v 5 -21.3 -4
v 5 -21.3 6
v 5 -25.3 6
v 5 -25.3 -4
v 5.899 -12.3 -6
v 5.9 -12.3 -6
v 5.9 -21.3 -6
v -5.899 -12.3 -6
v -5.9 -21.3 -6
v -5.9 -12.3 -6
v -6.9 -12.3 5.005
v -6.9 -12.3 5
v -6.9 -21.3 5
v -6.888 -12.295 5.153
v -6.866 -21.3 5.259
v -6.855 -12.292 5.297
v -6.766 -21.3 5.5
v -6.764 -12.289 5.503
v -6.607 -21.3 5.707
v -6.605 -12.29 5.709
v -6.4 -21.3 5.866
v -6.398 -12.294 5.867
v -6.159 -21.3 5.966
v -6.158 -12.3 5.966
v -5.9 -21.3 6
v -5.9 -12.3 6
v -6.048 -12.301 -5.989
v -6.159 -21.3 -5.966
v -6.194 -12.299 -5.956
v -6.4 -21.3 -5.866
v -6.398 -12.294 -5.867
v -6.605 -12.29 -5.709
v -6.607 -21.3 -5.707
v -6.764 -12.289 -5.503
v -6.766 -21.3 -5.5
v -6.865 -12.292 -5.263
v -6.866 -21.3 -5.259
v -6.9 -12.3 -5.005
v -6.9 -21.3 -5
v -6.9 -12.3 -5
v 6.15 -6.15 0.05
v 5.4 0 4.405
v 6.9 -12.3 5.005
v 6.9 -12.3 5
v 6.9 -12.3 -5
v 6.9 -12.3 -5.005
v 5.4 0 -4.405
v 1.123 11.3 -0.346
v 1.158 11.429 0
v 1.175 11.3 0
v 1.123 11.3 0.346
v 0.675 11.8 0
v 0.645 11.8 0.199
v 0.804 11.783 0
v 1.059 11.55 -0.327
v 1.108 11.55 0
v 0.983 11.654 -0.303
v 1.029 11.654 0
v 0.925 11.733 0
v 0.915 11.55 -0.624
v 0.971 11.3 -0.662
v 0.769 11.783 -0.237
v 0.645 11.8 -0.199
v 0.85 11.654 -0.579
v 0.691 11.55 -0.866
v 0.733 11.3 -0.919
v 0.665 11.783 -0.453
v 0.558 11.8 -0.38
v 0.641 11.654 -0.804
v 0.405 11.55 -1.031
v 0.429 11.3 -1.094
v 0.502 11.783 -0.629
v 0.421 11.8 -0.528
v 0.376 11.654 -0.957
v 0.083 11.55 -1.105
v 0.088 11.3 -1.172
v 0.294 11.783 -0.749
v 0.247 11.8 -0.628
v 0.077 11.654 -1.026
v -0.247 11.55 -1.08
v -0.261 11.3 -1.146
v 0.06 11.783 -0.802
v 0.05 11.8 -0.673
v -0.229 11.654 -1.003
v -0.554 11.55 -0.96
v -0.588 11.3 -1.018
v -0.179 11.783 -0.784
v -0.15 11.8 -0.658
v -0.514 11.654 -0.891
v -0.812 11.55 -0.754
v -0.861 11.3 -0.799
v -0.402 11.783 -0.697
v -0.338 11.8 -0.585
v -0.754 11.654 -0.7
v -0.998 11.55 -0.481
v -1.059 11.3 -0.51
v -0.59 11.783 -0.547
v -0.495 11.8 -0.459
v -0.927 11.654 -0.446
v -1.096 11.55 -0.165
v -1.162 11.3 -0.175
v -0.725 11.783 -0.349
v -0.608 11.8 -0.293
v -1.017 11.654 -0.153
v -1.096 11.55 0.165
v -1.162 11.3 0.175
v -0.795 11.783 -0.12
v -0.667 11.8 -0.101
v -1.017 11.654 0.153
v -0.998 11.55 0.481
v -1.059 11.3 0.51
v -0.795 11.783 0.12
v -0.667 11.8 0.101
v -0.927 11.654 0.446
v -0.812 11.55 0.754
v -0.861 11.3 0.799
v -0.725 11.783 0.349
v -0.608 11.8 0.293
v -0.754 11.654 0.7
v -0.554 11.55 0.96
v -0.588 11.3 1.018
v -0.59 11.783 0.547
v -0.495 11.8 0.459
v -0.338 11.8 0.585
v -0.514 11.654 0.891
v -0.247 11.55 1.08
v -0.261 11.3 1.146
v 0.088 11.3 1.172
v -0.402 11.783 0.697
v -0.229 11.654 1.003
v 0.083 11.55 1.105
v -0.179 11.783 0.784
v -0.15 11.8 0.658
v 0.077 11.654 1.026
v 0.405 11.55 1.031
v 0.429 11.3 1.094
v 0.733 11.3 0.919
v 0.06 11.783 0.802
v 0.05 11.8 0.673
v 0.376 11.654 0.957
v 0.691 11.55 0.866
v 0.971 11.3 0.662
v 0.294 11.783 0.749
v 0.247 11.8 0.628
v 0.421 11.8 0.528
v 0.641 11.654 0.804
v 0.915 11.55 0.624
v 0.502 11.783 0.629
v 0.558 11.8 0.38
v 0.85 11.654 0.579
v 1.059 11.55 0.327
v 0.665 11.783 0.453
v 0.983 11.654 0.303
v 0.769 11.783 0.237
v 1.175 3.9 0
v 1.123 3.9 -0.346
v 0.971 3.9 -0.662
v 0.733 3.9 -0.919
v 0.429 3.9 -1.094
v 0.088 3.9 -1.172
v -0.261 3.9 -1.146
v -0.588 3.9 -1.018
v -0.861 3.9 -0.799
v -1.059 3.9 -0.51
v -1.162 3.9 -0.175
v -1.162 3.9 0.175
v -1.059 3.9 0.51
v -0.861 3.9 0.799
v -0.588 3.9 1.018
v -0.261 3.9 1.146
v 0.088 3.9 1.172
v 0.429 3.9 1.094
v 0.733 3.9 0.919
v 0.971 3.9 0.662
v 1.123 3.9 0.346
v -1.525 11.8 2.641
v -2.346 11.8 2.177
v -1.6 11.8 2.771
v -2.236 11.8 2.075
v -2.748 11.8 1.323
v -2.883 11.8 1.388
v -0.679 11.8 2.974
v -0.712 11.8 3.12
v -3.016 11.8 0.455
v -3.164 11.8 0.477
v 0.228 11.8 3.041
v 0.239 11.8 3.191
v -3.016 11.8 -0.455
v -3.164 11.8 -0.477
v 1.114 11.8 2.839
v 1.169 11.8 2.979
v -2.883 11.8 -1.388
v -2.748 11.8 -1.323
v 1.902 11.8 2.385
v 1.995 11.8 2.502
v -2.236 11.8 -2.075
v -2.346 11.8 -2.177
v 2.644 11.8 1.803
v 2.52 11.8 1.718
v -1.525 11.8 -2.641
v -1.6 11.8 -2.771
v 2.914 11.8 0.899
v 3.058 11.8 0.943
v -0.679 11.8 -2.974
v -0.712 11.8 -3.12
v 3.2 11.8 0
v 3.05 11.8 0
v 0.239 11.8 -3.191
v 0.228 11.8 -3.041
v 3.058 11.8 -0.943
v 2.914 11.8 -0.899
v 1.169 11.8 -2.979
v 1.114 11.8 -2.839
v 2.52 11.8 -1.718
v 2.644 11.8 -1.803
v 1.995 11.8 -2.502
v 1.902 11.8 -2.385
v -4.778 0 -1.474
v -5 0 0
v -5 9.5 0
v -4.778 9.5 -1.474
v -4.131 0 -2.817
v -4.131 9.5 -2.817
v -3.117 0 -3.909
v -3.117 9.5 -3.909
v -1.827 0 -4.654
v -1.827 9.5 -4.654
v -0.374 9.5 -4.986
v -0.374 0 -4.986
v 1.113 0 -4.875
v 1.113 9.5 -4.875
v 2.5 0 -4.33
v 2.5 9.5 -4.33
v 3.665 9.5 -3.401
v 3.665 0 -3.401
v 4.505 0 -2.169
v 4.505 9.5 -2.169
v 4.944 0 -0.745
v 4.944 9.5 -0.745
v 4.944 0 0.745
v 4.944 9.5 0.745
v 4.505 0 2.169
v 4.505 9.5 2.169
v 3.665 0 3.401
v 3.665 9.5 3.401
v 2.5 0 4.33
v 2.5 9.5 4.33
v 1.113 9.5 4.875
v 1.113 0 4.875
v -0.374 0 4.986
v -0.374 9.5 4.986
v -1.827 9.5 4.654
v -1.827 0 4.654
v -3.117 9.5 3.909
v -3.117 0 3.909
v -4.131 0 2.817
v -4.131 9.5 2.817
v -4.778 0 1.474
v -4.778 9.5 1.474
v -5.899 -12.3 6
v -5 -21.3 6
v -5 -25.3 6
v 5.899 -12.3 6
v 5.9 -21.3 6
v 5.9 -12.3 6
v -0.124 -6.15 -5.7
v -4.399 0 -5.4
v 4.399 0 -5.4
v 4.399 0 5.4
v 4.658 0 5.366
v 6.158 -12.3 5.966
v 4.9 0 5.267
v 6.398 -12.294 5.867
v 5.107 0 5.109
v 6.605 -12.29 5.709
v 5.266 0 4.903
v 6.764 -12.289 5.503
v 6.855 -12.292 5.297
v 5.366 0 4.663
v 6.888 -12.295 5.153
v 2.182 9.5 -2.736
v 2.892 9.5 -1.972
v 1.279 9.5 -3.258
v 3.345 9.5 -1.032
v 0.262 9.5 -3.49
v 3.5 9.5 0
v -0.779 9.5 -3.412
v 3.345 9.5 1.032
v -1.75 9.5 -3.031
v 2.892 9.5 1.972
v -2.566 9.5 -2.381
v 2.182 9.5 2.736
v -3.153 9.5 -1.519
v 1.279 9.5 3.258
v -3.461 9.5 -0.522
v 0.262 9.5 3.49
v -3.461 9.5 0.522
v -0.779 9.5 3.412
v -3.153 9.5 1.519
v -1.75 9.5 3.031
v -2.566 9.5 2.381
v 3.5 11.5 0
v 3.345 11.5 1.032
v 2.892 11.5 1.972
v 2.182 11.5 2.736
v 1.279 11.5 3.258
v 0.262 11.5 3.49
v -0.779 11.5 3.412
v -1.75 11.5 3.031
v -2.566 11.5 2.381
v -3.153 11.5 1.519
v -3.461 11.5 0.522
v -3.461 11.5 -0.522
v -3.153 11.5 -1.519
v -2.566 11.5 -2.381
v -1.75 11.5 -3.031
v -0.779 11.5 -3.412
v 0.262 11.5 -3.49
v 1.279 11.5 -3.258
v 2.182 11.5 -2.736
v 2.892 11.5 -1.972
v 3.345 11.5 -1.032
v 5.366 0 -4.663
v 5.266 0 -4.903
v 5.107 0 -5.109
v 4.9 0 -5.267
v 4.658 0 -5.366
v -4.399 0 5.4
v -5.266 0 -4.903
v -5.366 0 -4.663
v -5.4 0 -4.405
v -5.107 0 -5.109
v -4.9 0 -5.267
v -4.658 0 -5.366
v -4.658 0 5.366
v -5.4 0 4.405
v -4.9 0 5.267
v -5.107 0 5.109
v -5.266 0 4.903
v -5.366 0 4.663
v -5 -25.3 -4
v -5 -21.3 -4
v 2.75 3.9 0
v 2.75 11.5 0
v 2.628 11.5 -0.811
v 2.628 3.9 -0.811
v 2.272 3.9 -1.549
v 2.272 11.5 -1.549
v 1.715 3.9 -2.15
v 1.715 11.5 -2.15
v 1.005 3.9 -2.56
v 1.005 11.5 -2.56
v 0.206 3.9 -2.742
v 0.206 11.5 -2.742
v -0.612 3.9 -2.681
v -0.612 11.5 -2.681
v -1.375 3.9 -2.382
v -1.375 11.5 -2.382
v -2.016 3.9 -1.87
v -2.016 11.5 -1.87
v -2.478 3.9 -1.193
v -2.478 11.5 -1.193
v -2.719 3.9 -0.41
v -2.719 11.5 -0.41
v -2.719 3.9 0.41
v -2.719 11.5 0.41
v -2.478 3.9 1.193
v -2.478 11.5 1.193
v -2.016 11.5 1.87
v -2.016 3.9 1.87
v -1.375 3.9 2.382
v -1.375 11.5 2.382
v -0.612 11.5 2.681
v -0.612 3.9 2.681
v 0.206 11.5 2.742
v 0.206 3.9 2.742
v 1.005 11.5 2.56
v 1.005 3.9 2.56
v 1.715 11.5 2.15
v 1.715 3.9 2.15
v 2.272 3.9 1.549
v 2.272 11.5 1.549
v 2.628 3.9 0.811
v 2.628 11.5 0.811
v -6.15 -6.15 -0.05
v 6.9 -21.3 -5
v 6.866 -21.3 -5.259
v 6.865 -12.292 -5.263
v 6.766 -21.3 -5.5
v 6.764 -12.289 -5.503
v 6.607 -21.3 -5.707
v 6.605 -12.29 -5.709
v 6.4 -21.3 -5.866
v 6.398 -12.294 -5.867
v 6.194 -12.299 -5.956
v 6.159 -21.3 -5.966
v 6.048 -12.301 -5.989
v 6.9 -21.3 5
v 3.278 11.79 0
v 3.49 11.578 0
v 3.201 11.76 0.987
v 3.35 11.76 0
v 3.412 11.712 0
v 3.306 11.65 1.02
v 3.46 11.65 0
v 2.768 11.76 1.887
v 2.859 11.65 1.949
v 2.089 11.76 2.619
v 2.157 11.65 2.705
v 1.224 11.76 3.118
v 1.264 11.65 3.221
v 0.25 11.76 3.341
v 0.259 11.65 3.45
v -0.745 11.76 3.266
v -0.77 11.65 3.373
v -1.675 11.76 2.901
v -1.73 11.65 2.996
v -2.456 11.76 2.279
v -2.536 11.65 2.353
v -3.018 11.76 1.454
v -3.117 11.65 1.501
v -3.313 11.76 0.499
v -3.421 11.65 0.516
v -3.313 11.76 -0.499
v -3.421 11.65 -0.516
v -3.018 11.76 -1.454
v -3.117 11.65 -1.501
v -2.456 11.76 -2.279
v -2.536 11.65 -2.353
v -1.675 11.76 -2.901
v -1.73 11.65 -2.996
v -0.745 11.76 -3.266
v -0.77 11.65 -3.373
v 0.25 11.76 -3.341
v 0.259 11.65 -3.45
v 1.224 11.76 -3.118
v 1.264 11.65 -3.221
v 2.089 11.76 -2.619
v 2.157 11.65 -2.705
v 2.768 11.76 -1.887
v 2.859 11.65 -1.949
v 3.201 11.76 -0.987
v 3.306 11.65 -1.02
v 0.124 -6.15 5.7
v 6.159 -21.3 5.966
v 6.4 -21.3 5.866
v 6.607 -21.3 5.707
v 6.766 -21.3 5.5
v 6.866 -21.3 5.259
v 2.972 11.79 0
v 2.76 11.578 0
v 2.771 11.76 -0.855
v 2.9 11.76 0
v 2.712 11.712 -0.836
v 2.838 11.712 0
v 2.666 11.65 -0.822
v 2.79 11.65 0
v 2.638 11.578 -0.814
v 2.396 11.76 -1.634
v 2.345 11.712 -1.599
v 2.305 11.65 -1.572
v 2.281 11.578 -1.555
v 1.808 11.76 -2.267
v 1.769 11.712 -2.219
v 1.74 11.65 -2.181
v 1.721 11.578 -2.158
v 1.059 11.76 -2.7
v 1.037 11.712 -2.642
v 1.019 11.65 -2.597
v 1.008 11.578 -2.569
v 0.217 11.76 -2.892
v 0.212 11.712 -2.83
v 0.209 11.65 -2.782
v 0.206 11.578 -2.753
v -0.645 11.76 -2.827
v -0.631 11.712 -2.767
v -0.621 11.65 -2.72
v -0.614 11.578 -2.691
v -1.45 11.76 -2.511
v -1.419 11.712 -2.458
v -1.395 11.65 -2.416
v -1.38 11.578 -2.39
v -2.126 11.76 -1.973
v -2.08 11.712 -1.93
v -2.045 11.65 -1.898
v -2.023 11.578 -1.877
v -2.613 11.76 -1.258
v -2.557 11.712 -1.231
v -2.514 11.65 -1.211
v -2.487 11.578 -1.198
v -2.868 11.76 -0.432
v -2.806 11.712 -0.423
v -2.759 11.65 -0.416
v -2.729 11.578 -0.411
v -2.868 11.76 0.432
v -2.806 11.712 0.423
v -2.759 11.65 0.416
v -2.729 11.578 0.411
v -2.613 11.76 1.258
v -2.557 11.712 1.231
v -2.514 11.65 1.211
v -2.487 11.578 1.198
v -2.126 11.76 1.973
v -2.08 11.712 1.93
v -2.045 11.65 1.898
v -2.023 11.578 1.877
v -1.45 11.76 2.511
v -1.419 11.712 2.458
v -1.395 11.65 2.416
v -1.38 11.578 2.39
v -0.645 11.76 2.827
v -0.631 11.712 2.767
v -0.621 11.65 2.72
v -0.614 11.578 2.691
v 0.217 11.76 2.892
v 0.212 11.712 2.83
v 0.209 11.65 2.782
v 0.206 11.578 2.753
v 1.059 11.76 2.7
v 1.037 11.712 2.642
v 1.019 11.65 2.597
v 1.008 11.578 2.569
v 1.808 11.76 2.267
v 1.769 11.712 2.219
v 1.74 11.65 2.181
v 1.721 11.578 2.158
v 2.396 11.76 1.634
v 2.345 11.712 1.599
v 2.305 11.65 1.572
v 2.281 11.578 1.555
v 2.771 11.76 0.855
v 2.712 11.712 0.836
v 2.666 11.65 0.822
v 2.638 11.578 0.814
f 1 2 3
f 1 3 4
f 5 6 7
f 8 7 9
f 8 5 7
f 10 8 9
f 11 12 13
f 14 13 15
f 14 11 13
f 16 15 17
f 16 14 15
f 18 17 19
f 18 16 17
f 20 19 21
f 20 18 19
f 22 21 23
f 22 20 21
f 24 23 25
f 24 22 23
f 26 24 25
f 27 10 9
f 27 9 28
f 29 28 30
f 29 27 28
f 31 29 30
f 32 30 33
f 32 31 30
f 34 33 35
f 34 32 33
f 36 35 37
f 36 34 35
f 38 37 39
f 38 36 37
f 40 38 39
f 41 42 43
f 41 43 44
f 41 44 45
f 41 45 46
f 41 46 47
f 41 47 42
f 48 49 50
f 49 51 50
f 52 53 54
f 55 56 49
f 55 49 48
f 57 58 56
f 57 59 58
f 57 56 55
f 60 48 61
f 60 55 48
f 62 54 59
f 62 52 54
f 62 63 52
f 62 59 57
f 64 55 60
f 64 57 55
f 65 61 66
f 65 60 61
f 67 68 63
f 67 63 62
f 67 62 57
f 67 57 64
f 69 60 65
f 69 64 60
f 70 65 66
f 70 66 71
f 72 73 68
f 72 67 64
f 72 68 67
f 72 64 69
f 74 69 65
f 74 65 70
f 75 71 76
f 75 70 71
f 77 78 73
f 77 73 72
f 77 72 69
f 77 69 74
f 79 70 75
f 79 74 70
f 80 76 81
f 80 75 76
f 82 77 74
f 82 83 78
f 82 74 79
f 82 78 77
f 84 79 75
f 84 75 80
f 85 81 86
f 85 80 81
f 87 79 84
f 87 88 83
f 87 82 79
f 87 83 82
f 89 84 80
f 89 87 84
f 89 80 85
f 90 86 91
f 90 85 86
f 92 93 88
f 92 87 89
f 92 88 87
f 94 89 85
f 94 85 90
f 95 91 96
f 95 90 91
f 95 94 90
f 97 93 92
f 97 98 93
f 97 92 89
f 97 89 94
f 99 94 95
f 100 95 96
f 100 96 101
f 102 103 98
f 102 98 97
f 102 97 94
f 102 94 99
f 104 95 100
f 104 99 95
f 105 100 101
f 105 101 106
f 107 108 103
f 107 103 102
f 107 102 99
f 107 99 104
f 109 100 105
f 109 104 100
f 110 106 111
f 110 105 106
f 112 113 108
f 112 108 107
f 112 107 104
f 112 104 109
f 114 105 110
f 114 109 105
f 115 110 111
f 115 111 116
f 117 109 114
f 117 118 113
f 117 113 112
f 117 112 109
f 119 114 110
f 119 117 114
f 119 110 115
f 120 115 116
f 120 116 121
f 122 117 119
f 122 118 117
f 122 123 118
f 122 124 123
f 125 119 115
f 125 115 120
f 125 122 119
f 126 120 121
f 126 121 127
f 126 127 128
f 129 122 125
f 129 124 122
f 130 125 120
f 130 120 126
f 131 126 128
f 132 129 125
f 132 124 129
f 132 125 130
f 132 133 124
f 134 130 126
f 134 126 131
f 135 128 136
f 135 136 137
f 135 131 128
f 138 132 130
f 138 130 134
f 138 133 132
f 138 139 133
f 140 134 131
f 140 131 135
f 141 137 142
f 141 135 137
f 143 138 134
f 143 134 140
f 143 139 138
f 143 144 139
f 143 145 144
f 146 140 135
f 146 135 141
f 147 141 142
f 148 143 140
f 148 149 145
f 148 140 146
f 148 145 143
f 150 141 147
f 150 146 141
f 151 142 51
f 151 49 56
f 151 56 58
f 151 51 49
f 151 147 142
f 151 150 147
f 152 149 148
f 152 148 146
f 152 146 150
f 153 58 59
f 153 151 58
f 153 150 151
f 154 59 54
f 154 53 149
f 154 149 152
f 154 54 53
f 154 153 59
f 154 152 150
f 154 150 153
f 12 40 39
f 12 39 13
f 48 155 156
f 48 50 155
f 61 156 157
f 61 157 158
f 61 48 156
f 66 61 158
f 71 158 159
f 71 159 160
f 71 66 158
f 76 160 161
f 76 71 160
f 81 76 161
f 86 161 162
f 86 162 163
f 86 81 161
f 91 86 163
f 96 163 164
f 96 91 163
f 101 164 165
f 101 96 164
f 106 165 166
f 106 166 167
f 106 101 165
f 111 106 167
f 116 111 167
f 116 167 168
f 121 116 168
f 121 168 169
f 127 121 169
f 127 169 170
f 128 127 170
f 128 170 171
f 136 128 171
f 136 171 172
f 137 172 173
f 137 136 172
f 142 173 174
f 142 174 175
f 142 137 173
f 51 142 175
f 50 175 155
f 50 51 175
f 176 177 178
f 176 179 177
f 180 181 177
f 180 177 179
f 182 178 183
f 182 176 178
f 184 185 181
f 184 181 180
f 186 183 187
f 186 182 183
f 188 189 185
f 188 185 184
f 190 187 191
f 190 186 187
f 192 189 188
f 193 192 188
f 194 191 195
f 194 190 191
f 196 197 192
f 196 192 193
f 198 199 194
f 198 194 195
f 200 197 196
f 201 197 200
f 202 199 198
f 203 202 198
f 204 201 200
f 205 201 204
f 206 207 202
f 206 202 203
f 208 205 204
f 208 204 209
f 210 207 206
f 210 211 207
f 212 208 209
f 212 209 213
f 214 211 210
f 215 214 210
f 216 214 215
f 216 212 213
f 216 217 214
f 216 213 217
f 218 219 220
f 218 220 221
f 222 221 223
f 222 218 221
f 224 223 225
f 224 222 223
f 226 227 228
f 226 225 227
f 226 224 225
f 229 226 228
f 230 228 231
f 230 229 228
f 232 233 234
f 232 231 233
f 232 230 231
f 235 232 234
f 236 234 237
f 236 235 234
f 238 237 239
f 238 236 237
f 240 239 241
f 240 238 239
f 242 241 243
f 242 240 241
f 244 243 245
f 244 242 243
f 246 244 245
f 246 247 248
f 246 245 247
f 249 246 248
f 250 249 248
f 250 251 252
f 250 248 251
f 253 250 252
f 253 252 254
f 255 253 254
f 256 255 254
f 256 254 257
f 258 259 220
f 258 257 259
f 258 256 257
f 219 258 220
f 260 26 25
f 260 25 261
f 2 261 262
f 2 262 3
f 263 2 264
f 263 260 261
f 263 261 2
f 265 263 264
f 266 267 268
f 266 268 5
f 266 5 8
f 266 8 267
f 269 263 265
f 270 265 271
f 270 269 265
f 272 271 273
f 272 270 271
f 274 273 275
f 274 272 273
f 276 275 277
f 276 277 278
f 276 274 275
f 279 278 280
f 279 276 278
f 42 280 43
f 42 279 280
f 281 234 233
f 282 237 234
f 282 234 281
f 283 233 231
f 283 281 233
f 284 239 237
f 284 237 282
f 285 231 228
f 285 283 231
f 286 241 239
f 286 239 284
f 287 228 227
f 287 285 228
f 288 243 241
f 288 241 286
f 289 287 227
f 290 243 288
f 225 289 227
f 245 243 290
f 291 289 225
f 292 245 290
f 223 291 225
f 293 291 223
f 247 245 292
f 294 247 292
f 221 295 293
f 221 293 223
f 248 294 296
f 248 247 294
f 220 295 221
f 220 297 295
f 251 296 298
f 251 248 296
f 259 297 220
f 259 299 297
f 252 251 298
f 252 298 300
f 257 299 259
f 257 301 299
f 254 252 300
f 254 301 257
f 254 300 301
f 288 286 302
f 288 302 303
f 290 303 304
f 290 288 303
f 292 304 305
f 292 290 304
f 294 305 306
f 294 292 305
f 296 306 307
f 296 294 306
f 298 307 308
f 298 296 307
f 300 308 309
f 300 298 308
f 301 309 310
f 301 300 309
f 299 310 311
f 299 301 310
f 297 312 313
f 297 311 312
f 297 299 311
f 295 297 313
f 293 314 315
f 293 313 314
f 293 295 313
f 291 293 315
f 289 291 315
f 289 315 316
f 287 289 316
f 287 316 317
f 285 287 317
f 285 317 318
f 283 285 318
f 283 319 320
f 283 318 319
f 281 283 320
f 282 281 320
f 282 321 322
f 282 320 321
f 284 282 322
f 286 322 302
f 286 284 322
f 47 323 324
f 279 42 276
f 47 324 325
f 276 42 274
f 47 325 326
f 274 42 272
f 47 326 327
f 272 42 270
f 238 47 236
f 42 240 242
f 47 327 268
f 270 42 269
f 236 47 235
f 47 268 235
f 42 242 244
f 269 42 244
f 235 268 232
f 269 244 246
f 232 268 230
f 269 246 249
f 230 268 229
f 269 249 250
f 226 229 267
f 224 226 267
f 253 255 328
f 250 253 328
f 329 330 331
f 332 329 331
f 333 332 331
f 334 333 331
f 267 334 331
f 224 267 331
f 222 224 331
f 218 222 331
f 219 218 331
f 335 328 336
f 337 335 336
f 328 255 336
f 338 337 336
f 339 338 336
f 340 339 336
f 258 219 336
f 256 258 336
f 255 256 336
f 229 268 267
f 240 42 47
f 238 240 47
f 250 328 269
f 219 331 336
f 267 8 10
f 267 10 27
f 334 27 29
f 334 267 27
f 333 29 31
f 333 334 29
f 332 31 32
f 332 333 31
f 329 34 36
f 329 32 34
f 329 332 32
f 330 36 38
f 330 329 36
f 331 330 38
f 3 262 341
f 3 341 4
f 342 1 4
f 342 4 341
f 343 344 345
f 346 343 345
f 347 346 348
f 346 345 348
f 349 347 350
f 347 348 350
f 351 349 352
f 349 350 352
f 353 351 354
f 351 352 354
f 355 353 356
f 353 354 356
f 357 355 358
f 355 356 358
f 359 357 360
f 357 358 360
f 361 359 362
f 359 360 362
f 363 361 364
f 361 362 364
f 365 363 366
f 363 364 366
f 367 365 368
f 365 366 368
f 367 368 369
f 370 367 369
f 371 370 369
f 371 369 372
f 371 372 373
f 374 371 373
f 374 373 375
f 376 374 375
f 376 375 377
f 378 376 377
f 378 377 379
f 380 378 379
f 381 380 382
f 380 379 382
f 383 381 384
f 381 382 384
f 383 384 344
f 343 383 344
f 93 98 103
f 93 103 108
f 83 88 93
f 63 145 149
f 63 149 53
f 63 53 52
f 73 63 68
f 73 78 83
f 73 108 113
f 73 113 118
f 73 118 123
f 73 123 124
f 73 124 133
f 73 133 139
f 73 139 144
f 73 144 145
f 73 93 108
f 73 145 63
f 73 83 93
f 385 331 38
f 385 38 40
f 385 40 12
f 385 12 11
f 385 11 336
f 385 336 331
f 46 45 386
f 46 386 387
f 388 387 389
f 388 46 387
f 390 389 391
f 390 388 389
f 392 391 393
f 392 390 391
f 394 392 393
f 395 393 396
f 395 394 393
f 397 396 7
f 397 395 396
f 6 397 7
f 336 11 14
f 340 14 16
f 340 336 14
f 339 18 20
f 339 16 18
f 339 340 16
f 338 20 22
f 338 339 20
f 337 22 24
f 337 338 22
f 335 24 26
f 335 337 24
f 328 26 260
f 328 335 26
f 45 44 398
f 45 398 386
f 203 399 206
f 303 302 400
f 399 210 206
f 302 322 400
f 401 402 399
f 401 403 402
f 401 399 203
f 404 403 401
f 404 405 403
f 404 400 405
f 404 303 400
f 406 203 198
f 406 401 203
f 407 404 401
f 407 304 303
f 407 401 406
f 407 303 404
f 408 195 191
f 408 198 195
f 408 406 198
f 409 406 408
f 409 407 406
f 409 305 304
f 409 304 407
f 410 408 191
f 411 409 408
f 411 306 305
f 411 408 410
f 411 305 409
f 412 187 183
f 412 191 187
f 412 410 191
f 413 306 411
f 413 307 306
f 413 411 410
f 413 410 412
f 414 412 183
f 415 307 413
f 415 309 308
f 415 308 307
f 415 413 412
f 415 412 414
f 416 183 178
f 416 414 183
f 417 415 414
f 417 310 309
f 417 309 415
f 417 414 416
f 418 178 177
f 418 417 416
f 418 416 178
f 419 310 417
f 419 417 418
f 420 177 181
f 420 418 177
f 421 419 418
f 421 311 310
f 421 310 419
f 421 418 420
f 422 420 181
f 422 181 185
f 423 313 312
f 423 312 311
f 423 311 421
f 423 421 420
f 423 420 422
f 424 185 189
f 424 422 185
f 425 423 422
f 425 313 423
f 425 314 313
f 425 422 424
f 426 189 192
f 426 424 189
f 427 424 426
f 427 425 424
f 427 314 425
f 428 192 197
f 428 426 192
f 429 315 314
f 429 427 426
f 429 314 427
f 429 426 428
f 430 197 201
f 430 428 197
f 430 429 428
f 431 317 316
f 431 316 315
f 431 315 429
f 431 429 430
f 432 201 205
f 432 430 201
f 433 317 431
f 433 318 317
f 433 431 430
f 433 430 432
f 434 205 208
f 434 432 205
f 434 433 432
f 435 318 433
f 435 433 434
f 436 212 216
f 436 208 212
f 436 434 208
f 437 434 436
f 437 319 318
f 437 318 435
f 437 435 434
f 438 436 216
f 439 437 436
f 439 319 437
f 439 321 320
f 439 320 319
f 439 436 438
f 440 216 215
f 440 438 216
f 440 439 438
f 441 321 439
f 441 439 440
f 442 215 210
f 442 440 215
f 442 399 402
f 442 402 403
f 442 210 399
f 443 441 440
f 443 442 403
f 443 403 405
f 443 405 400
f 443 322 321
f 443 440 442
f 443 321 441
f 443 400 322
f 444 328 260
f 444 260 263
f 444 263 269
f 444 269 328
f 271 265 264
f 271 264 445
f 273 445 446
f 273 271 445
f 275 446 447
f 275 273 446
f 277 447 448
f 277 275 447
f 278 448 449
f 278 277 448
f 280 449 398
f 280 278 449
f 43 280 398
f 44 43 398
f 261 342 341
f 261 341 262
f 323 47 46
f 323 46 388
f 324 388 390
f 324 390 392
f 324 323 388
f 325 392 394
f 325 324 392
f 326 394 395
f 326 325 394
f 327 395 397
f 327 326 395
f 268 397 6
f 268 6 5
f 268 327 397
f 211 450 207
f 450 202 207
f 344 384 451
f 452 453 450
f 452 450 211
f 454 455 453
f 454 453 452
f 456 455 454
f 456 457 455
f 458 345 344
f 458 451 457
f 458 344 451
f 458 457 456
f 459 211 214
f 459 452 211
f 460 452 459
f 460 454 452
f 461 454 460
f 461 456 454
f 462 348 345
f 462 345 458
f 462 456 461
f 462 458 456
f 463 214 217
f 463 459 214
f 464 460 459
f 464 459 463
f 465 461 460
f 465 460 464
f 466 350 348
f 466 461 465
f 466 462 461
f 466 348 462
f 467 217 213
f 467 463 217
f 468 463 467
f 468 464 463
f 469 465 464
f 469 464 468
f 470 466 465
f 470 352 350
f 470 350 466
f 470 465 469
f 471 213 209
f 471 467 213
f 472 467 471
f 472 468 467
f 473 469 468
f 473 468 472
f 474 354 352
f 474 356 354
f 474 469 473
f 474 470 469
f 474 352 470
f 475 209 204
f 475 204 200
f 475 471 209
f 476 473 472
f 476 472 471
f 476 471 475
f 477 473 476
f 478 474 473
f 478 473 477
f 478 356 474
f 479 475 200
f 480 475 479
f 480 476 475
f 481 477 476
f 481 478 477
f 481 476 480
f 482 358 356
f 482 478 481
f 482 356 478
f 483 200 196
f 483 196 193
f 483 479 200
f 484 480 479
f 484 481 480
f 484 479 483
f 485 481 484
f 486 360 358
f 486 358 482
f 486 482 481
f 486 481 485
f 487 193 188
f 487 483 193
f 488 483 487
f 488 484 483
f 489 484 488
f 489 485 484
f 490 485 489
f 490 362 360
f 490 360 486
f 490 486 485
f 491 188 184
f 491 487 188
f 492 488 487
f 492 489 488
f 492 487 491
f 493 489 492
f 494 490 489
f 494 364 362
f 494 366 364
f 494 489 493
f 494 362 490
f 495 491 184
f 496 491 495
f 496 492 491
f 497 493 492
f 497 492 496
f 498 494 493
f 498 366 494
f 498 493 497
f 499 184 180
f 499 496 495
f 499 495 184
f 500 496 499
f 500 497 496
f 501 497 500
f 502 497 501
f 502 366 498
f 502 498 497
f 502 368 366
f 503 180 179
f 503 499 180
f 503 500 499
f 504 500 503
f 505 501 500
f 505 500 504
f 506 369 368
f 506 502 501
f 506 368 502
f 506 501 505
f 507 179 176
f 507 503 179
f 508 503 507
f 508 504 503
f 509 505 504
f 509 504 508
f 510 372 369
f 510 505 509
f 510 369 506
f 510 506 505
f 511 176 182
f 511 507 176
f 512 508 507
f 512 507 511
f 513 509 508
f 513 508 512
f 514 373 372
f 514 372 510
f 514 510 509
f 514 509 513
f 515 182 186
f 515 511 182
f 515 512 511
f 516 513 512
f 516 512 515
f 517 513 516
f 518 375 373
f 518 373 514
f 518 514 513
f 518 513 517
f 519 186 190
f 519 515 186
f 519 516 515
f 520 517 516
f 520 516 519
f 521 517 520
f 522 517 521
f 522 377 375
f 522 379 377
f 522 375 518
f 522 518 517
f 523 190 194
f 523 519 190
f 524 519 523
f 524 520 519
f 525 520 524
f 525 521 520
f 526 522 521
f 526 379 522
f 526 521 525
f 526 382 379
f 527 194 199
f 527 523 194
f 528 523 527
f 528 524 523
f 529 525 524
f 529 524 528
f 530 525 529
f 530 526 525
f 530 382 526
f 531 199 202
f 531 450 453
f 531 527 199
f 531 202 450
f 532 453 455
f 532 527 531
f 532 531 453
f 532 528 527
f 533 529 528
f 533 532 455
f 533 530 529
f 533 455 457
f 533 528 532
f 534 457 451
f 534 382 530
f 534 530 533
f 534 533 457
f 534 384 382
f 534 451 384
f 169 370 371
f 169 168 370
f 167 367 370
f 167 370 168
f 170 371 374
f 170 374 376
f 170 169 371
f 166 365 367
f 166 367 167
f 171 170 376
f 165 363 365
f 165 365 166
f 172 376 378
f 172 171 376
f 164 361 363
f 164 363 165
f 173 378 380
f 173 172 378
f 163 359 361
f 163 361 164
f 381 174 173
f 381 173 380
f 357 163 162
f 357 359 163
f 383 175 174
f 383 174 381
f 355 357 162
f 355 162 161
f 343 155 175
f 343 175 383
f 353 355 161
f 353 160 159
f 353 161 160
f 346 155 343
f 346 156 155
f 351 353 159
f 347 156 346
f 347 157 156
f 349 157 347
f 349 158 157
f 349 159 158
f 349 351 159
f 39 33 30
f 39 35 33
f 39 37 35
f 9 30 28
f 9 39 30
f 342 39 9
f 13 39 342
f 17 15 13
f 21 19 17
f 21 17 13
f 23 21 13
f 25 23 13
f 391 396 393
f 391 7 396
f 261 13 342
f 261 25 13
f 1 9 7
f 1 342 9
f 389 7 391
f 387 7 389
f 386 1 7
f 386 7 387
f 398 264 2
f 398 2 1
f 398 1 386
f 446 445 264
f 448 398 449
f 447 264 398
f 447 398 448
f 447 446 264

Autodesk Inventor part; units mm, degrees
ref_plane "YZ Plane" through (0, 0, 0) normal (1, 0, 0) x (0, 1, 0)
ref_plane "XZ Plane" through (0, 0, 0) normal (0, 1, 0) x (-1, 0, 0)
sketch "Sketch1" plane through (0, 0, 0) normal (0, 1, 0) x (-1, 0, 0)
  circle A0 centre (0, 0) radius 5
  dimension "d0" = 10
extrude "Extrusion1" add sketch "Sketch1" along normal blind 9.5
sketch "Sketch2" plane through (0, 9.5, 0) normal (0, 1, 0) x (1, 0, 0)
  circle A0 centre (0, 0) radius 3.5
  dimension "d3" = 7
extrude "Extrusion2" add sketch "Sketch2" along normal blind 2.3
sketch "Sketch3" plane through (0, 0, 0) normal (0, -1, 0) x (1, 0, 0)
  line L0 (5.4, -5.4) -> (-5.4, -5.4)
  line L1 (-5.4, -5.4) -> (-5.4, 5.4)
  line L2 (-5.4, 5.4) -> (5.4, 5.4)
  line L3 (5.4, 5.4) -> (5.4, -5.4)
  line L4 (5.4, -5.4) -> (-5.4, 5.4) construction
  line L5 (-5.4, -5.4) -> (5.4, 5.4) construction
  point P0 (0, 0)
  dimension "d6" = 10.8
  dimension "d7" = 10.8
ref_plane "Work Plane1" through (0, -12.3, 0) normal (0, -1, 0) x (1, 0, 0)
sketch "Sketch4" plane through (0, -12.3, 0) normal (0, -1, 0) x (1, 0, 0)
  line L0 (6.9, -6) -> (-6.9, -6)
  line L1 (-6.9, -6) -> (-6.9, 6)
  line L2 (-6.9, 6) -> (6.9, 6)
  line L3 (6.9, 6) -> (6.9, -6)
  line L4 (6.9, -6) -> (-6.9, 6) construction
  line L5 (-6.9, -6) -> (6.9, 6) construction
  point P0 (0, 0)
  dimension "d9" = 13.8
  dimension "d10" = 12
loft "Loft1" add profiles "Sketch3", "Sketch4"
sketch "Sketch6" plane through (-6.9, -12.3, -6) normal (0, -1, 0) x (1, 0, 0)
  line L0 (12.3, 0.6) -> (13.8, 0) projected
  line L1 (0, 12) -> (13.8, 12)
  line L2 (13.8, 12) -> (13.8, 0)
  line L3 (13.8, 0) -> (0, 0)
  line L4 (0, 0) -> (0, 12)
  line L5 (0, 12) -> (13.8, 0) construction
  line L6 (13.8, 12) -> (0, 0) construction
  point P0 (6.9, 6)
extrude "Extrusion3" add sketch "Sketch6" along normal blind 9
fillet "Fillet2" radius 1 8 edges at (6.15, -6.15, -5.7) (-6.15, -6.15, -5.7) (6.15, -6.15, 5.7) (-6.15, -6.15, 5.7) (6.9, -16.8, 6) (6.9, -16.8, -6) (-6.9, -16.8, 6) (-6.9, -16.8, -6)
sketch "Sketch8" plane through (-6.9, -21.3, -6) normal (0, -1, 0) x (1, 0, 0)
  line L0 (1.0015, 12) -> (12.7985, 12) projected
  line L1 (11.9, 12) -> (11.9, 2)
  line L2 (11.9, 2) -> (1.9, 2)
  line L3 (1.9, 2) -> (1.9, 12)
  line L4 (1.9, 12) -> (11.9, 12)
  line L5 (13.8, 1) -> (13.8, 11) projected
  line L6 (0, 11) -> (0, 1) projected
  point P0 (6.9, 6)
  dimension "d25" = 10
  dimension "d26" = 10
  dimension "d27" = 1.9
  dimension "d29" = 1.9
extrude "Extrusion5" add sketch "Sketch8" along normal blind 4
sketch "Sketch9" plane through (0, 11.8, 0) normal (0, 1, 0) x (1, 0, 0)
  circle A0 centre (0, 0) radius 1.175
  circle A1 centre (0, 0) radius 2.75
  dimension "d32" = 2.35
  dimension "d33" = 5.5
extrude "Extrusion6" cut sketch "Sketch9" against normal blind 7.9
fillet "Fillet3" radius 0.5 1 edges at (-1.175, 11.8, 0)
fillet "Fillet4" radius 0.3 1 edges at (-3.5, 11.8, 0)
fillet "Fillet5" radius 0.3 1 edges at (-2.75, 11.8, 0)
properties part number "ConectorFuente"
